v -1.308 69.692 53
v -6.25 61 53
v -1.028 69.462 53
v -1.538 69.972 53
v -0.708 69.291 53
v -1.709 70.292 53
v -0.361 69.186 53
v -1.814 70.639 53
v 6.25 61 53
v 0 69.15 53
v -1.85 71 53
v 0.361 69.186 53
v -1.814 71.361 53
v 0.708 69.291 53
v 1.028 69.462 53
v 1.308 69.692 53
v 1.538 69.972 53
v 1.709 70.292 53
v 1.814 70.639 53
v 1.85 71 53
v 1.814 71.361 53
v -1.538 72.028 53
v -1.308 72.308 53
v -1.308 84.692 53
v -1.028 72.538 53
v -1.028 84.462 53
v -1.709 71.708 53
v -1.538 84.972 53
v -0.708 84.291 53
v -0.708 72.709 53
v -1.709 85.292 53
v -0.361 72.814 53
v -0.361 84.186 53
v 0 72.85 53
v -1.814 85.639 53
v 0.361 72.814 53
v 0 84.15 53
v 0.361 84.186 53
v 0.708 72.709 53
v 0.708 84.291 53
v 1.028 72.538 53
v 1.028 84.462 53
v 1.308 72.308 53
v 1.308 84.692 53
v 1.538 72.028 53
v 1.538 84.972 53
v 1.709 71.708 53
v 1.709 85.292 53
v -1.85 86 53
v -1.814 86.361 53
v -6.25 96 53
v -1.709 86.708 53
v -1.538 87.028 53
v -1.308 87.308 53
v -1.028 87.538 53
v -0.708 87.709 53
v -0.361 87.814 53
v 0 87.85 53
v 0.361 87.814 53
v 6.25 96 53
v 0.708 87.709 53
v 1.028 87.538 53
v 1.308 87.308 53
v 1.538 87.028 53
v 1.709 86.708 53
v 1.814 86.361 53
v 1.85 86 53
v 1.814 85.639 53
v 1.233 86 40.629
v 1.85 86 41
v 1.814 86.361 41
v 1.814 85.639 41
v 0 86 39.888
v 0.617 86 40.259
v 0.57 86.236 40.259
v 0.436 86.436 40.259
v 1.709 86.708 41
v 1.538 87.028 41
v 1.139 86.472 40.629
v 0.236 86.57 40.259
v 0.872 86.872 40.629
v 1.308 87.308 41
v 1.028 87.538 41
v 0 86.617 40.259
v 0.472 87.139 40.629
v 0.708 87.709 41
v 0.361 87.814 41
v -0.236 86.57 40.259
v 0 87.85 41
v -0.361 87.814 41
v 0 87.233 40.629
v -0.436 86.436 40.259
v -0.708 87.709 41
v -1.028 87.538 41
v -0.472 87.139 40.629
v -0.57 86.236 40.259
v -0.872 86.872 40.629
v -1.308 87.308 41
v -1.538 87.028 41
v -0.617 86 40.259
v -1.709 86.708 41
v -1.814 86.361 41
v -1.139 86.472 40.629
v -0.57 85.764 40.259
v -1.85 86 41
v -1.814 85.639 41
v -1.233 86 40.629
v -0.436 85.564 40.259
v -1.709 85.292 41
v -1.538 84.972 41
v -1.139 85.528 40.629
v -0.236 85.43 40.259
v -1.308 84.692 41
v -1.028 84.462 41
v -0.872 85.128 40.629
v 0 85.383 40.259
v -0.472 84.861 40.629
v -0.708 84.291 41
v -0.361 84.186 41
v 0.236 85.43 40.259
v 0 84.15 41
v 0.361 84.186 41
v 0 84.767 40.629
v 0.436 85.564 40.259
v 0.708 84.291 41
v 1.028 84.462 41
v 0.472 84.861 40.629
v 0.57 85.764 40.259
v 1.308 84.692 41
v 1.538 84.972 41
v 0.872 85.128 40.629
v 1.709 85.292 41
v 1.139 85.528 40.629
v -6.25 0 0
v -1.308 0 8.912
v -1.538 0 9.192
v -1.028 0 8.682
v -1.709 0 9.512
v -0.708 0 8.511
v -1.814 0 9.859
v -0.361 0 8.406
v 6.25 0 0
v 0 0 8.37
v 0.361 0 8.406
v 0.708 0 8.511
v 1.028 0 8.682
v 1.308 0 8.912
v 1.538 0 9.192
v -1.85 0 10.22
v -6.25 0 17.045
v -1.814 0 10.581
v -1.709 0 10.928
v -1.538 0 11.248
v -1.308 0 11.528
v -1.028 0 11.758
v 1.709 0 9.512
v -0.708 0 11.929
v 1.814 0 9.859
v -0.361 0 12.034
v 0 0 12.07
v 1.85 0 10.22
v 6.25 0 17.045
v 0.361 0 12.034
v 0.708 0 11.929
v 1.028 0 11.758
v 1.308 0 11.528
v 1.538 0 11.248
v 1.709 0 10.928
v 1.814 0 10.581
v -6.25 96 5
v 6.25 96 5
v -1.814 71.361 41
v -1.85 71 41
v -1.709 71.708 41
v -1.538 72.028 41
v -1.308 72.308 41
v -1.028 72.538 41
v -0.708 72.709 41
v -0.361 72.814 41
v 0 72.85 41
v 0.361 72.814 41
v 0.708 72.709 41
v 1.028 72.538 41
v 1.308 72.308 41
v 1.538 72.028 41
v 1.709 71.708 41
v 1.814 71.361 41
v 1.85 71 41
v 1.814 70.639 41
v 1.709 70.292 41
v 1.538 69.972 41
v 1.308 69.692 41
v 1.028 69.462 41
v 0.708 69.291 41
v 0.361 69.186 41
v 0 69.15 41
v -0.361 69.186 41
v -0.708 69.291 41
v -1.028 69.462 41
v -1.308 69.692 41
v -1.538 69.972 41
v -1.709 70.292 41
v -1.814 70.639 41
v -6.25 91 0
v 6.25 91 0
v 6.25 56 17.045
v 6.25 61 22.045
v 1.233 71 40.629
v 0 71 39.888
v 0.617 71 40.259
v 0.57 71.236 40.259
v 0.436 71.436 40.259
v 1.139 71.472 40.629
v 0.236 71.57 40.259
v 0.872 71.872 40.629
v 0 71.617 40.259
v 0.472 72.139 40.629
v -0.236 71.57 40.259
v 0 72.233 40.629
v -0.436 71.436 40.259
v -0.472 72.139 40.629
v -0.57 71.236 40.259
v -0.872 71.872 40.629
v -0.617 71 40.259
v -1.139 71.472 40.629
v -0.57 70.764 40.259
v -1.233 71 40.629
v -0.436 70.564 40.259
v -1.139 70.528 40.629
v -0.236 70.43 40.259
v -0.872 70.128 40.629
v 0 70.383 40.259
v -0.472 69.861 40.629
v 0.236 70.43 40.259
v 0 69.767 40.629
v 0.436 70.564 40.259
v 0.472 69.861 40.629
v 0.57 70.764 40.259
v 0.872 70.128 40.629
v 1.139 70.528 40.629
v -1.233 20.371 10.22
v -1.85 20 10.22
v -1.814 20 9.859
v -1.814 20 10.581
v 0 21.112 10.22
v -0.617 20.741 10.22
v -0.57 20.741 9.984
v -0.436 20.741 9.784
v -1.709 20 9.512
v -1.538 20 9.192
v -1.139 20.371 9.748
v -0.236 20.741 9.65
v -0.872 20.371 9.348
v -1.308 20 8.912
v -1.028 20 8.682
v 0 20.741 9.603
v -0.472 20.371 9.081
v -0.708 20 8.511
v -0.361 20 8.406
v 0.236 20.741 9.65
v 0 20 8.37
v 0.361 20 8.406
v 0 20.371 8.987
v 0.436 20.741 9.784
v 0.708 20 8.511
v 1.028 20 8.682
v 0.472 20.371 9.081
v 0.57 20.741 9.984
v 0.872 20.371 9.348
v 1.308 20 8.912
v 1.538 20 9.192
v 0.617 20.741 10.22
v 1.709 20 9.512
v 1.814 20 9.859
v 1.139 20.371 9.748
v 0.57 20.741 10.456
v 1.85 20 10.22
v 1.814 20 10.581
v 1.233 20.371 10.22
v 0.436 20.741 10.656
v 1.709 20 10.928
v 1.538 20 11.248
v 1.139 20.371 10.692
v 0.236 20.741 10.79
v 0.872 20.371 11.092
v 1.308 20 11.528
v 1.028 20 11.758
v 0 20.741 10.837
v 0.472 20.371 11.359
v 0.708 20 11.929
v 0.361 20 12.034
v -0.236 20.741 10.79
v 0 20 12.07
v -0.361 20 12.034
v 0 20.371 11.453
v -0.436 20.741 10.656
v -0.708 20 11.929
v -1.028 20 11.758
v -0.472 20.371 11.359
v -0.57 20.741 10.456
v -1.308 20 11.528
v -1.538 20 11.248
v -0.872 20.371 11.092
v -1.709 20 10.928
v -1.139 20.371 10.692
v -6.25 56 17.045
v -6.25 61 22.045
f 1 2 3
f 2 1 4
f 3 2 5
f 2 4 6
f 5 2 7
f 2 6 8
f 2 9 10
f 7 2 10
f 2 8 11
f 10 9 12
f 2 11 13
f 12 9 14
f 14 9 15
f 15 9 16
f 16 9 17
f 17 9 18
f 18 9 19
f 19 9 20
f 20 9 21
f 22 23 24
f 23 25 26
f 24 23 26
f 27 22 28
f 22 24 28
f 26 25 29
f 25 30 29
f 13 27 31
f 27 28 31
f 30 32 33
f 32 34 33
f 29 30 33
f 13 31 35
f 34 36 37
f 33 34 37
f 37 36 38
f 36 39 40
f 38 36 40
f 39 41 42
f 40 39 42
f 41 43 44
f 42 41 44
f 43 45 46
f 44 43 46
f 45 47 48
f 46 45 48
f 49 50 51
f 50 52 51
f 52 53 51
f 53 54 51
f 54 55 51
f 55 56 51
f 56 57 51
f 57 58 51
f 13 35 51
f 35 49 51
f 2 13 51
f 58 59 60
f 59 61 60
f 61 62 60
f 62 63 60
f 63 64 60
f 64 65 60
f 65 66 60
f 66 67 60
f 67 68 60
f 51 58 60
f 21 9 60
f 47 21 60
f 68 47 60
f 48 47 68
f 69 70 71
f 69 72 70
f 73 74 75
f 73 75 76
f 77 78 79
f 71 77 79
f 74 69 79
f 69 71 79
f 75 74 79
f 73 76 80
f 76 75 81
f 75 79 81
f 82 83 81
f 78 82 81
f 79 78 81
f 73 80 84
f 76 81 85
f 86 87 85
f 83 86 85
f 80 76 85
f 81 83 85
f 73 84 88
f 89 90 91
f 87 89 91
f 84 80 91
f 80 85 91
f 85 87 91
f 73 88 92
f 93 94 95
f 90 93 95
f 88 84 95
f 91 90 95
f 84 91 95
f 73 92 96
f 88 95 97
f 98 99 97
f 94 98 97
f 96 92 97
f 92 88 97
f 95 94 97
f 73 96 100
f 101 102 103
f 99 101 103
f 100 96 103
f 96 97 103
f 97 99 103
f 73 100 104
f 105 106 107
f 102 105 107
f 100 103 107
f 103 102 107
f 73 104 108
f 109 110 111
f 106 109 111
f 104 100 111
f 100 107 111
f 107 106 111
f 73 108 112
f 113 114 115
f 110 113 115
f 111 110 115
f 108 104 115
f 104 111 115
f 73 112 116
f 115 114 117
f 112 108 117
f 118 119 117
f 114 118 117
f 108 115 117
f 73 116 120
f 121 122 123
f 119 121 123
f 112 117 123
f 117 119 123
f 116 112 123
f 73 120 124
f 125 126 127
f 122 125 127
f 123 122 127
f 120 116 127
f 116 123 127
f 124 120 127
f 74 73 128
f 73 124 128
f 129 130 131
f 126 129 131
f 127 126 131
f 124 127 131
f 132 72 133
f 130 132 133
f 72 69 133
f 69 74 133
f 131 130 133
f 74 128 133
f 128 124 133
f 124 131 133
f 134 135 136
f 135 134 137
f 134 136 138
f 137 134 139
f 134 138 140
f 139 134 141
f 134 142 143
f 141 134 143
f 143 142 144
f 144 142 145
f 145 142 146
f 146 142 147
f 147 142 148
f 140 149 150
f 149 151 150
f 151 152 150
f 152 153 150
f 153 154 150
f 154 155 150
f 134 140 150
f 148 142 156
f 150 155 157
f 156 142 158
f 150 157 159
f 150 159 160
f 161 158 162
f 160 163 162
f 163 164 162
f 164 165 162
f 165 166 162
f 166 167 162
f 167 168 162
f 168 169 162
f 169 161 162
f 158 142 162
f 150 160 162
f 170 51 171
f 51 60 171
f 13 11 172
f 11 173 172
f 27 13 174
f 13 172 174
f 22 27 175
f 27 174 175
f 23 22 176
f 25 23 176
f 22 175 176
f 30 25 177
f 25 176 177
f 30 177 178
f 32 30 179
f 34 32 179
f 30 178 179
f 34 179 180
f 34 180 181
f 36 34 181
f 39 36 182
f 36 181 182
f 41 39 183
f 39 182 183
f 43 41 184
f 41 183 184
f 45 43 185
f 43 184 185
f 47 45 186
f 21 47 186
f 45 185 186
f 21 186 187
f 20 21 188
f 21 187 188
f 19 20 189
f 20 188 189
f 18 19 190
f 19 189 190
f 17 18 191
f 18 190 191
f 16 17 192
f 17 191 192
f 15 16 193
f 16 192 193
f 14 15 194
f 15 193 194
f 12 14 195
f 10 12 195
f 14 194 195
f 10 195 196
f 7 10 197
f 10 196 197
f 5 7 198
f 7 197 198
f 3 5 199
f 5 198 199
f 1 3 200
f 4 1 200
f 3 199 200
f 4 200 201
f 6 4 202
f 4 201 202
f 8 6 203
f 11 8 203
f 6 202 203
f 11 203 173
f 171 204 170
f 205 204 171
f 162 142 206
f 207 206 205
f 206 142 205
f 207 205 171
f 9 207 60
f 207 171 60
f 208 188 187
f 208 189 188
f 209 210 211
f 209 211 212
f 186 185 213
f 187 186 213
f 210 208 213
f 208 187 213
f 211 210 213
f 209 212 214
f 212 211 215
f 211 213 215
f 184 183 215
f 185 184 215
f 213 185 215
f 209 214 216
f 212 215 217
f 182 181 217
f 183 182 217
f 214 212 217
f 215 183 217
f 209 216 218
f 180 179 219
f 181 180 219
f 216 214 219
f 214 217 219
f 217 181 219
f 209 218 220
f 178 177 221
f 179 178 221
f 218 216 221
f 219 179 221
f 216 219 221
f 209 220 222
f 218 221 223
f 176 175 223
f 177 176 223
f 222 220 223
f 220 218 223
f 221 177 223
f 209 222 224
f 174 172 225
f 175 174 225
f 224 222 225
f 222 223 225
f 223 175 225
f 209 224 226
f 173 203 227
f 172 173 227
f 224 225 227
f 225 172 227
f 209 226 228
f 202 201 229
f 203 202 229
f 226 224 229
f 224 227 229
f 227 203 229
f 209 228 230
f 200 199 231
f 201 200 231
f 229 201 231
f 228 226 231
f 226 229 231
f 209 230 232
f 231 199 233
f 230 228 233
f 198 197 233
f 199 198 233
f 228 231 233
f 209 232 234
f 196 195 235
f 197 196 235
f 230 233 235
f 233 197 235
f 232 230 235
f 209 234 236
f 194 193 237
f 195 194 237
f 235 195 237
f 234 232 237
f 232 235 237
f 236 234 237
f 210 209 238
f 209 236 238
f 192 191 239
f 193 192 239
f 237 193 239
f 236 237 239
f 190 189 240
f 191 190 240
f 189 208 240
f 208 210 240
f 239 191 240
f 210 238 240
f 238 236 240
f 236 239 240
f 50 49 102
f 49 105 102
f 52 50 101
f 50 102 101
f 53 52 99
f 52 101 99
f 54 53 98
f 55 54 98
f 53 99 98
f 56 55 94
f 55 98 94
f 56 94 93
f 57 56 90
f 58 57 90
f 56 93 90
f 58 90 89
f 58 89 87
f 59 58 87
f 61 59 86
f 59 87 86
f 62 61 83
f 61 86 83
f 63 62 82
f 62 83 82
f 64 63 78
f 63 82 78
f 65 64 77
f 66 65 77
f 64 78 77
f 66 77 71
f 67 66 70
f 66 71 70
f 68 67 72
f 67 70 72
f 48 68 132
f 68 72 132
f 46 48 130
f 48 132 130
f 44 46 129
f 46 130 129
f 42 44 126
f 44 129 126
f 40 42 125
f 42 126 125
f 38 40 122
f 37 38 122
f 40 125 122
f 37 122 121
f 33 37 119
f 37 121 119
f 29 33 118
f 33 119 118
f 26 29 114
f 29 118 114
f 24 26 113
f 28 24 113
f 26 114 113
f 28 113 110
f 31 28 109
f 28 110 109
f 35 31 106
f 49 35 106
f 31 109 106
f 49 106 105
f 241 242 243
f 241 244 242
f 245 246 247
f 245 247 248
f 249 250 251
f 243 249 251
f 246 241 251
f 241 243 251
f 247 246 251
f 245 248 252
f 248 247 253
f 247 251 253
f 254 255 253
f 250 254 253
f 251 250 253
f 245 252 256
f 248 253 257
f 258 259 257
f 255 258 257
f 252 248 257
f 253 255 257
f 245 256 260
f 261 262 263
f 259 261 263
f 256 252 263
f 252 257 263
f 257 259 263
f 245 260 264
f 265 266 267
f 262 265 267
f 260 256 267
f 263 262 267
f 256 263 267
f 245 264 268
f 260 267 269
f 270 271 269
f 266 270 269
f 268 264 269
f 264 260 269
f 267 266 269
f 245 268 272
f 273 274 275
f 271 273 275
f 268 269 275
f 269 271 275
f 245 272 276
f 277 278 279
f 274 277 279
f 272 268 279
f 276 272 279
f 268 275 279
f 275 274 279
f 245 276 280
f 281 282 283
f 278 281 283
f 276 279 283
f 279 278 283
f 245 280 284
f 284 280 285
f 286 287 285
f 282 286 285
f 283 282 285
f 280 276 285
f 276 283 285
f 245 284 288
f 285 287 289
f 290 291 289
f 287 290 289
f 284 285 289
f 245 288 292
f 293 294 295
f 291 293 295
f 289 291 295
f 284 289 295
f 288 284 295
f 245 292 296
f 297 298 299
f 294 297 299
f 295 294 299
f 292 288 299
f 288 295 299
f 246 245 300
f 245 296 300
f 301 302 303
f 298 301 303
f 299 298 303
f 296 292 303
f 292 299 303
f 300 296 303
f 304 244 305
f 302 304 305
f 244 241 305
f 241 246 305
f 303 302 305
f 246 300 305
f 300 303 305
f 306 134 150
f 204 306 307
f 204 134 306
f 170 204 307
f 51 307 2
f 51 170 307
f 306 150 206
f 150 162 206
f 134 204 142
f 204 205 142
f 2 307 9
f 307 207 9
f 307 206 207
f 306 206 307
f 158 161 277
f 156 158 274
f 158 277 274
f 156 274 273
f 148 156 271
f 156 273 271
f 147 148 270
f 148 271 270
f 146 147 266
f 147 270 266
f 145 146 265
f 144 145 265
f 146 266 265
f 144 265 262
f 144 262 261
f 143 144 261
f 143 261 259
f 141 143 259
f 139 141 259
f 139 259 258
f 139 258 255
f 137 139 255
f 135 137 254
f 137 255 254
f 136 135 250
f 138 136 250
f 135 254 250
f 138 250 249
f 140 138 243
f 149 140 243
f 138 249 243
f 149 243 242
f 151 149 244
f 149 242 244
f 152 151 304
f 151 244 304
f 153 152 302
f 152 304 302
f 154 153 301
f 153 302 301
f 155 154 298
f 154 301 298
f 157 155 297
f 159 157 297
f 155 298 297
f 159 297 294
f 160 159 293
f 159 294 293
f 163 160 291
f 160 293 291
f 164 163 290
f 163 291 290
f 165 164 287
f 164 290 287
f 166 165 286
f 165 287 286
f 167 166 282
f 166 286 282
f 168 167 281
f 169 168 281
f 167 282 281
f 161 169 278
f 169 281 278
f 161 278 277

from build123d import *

# Parameters (mm, degrees)
BOSS_EXTRUDE1_DEPTH            = 6.25
CHAMFER1_SIZE                  = 5
F_3_7_3_7_DIAMETER_HOLE1_D     = 3.7
F_3_7_3_7_DIAMETER_HOLE1_DEPTH = 12
F_3_7_3_7_DIAMETER_HOLE1_TIP   = 1.111592145
F_3_7_3_7_DIAMETER_HOLE2_D     = 3.7
F_3_7_3_7_DIAMETER_HOLE2_DEPTH = 20
F_3_7_3_7_DIAMETER_HOLE2_TIP   = 1.111592145


with BuildPart() as part:
    # Sketch1 → Boss-Extrude1 (new, symmetric)
    with BuildSketch(Plane(origin=(0, 0, 0), x_dir=(0, 0, -1), z_dir=(1, 0, 0))):
        Polygon((0, 0), (-17.045, 0), (-17.045, 61), (-53, 61), (-53, 96), (0, 96), align=None)
    extrude(amount=BOSS_EXTRUDE1_DEPTH, both=True)

    # Chamfer1
    chamfer1_edges = [part.edges().sort_by_distance(p)[0] for p in [
        (0, 61, 17.045),
        (0, 96, 0),
    ]]
    chamfer(chamfer1_edges, length=CHAMFER1_SIZE)

    # Ø3.7 (3.7) Diameter Hole1
    with Locations(Plane.XY.offset(53)):
        with Locations((0, 86), (0, 71)):
            Hole(F_3_7_3_7_DIAMETER_HOLE1_D / 2, depth=F_3_7_3_7_DIAMETER_HOLE1_DEPTH)
            with Locations((0, 0, -(F_3_7_3_7_DIAMETER_HOLE1_DEPTH + F_3_7_3_7_DIAMETER_HOLE1_TIP / 2))):  # 118° drill point
                Cone(0, F_3_7_3_7_DIAMETER_HOLE1_D / 2, F_3_7_3_7_DIAMETER_HOLE1_TIP, mode=Mode.SUBTRACT)

    # Ø3.7 (3.7) Diameter Hole2
    with Locations(Plane(origin=(0, 0, 0), x_dir=(-1, 0, 0), z_dir=(0, -1, 0))):
        with Locations((0, -10.22)):
            Hole(F_3_7_3_7_DIAMETER_HOLE2_D / 2, depth=F_3_7_3_7_DIAMETER_HOLE2_DEPTH)
            with Locations((0, 0, -(F_3_7_3_7_DIAMETER_HOLE2_DEPTH + F_3_7_3_7_DIAMETER_HOLE2_TIP / 2))):  # 118° drill point
                Cone(0, F_3_7_3_7_DIAMETER_HOLE2_D / 2, F_3_7_3_7_DIAMETER_HOLE2_TIP, mode=Mode.SUBTRACT)


solid = part.part
